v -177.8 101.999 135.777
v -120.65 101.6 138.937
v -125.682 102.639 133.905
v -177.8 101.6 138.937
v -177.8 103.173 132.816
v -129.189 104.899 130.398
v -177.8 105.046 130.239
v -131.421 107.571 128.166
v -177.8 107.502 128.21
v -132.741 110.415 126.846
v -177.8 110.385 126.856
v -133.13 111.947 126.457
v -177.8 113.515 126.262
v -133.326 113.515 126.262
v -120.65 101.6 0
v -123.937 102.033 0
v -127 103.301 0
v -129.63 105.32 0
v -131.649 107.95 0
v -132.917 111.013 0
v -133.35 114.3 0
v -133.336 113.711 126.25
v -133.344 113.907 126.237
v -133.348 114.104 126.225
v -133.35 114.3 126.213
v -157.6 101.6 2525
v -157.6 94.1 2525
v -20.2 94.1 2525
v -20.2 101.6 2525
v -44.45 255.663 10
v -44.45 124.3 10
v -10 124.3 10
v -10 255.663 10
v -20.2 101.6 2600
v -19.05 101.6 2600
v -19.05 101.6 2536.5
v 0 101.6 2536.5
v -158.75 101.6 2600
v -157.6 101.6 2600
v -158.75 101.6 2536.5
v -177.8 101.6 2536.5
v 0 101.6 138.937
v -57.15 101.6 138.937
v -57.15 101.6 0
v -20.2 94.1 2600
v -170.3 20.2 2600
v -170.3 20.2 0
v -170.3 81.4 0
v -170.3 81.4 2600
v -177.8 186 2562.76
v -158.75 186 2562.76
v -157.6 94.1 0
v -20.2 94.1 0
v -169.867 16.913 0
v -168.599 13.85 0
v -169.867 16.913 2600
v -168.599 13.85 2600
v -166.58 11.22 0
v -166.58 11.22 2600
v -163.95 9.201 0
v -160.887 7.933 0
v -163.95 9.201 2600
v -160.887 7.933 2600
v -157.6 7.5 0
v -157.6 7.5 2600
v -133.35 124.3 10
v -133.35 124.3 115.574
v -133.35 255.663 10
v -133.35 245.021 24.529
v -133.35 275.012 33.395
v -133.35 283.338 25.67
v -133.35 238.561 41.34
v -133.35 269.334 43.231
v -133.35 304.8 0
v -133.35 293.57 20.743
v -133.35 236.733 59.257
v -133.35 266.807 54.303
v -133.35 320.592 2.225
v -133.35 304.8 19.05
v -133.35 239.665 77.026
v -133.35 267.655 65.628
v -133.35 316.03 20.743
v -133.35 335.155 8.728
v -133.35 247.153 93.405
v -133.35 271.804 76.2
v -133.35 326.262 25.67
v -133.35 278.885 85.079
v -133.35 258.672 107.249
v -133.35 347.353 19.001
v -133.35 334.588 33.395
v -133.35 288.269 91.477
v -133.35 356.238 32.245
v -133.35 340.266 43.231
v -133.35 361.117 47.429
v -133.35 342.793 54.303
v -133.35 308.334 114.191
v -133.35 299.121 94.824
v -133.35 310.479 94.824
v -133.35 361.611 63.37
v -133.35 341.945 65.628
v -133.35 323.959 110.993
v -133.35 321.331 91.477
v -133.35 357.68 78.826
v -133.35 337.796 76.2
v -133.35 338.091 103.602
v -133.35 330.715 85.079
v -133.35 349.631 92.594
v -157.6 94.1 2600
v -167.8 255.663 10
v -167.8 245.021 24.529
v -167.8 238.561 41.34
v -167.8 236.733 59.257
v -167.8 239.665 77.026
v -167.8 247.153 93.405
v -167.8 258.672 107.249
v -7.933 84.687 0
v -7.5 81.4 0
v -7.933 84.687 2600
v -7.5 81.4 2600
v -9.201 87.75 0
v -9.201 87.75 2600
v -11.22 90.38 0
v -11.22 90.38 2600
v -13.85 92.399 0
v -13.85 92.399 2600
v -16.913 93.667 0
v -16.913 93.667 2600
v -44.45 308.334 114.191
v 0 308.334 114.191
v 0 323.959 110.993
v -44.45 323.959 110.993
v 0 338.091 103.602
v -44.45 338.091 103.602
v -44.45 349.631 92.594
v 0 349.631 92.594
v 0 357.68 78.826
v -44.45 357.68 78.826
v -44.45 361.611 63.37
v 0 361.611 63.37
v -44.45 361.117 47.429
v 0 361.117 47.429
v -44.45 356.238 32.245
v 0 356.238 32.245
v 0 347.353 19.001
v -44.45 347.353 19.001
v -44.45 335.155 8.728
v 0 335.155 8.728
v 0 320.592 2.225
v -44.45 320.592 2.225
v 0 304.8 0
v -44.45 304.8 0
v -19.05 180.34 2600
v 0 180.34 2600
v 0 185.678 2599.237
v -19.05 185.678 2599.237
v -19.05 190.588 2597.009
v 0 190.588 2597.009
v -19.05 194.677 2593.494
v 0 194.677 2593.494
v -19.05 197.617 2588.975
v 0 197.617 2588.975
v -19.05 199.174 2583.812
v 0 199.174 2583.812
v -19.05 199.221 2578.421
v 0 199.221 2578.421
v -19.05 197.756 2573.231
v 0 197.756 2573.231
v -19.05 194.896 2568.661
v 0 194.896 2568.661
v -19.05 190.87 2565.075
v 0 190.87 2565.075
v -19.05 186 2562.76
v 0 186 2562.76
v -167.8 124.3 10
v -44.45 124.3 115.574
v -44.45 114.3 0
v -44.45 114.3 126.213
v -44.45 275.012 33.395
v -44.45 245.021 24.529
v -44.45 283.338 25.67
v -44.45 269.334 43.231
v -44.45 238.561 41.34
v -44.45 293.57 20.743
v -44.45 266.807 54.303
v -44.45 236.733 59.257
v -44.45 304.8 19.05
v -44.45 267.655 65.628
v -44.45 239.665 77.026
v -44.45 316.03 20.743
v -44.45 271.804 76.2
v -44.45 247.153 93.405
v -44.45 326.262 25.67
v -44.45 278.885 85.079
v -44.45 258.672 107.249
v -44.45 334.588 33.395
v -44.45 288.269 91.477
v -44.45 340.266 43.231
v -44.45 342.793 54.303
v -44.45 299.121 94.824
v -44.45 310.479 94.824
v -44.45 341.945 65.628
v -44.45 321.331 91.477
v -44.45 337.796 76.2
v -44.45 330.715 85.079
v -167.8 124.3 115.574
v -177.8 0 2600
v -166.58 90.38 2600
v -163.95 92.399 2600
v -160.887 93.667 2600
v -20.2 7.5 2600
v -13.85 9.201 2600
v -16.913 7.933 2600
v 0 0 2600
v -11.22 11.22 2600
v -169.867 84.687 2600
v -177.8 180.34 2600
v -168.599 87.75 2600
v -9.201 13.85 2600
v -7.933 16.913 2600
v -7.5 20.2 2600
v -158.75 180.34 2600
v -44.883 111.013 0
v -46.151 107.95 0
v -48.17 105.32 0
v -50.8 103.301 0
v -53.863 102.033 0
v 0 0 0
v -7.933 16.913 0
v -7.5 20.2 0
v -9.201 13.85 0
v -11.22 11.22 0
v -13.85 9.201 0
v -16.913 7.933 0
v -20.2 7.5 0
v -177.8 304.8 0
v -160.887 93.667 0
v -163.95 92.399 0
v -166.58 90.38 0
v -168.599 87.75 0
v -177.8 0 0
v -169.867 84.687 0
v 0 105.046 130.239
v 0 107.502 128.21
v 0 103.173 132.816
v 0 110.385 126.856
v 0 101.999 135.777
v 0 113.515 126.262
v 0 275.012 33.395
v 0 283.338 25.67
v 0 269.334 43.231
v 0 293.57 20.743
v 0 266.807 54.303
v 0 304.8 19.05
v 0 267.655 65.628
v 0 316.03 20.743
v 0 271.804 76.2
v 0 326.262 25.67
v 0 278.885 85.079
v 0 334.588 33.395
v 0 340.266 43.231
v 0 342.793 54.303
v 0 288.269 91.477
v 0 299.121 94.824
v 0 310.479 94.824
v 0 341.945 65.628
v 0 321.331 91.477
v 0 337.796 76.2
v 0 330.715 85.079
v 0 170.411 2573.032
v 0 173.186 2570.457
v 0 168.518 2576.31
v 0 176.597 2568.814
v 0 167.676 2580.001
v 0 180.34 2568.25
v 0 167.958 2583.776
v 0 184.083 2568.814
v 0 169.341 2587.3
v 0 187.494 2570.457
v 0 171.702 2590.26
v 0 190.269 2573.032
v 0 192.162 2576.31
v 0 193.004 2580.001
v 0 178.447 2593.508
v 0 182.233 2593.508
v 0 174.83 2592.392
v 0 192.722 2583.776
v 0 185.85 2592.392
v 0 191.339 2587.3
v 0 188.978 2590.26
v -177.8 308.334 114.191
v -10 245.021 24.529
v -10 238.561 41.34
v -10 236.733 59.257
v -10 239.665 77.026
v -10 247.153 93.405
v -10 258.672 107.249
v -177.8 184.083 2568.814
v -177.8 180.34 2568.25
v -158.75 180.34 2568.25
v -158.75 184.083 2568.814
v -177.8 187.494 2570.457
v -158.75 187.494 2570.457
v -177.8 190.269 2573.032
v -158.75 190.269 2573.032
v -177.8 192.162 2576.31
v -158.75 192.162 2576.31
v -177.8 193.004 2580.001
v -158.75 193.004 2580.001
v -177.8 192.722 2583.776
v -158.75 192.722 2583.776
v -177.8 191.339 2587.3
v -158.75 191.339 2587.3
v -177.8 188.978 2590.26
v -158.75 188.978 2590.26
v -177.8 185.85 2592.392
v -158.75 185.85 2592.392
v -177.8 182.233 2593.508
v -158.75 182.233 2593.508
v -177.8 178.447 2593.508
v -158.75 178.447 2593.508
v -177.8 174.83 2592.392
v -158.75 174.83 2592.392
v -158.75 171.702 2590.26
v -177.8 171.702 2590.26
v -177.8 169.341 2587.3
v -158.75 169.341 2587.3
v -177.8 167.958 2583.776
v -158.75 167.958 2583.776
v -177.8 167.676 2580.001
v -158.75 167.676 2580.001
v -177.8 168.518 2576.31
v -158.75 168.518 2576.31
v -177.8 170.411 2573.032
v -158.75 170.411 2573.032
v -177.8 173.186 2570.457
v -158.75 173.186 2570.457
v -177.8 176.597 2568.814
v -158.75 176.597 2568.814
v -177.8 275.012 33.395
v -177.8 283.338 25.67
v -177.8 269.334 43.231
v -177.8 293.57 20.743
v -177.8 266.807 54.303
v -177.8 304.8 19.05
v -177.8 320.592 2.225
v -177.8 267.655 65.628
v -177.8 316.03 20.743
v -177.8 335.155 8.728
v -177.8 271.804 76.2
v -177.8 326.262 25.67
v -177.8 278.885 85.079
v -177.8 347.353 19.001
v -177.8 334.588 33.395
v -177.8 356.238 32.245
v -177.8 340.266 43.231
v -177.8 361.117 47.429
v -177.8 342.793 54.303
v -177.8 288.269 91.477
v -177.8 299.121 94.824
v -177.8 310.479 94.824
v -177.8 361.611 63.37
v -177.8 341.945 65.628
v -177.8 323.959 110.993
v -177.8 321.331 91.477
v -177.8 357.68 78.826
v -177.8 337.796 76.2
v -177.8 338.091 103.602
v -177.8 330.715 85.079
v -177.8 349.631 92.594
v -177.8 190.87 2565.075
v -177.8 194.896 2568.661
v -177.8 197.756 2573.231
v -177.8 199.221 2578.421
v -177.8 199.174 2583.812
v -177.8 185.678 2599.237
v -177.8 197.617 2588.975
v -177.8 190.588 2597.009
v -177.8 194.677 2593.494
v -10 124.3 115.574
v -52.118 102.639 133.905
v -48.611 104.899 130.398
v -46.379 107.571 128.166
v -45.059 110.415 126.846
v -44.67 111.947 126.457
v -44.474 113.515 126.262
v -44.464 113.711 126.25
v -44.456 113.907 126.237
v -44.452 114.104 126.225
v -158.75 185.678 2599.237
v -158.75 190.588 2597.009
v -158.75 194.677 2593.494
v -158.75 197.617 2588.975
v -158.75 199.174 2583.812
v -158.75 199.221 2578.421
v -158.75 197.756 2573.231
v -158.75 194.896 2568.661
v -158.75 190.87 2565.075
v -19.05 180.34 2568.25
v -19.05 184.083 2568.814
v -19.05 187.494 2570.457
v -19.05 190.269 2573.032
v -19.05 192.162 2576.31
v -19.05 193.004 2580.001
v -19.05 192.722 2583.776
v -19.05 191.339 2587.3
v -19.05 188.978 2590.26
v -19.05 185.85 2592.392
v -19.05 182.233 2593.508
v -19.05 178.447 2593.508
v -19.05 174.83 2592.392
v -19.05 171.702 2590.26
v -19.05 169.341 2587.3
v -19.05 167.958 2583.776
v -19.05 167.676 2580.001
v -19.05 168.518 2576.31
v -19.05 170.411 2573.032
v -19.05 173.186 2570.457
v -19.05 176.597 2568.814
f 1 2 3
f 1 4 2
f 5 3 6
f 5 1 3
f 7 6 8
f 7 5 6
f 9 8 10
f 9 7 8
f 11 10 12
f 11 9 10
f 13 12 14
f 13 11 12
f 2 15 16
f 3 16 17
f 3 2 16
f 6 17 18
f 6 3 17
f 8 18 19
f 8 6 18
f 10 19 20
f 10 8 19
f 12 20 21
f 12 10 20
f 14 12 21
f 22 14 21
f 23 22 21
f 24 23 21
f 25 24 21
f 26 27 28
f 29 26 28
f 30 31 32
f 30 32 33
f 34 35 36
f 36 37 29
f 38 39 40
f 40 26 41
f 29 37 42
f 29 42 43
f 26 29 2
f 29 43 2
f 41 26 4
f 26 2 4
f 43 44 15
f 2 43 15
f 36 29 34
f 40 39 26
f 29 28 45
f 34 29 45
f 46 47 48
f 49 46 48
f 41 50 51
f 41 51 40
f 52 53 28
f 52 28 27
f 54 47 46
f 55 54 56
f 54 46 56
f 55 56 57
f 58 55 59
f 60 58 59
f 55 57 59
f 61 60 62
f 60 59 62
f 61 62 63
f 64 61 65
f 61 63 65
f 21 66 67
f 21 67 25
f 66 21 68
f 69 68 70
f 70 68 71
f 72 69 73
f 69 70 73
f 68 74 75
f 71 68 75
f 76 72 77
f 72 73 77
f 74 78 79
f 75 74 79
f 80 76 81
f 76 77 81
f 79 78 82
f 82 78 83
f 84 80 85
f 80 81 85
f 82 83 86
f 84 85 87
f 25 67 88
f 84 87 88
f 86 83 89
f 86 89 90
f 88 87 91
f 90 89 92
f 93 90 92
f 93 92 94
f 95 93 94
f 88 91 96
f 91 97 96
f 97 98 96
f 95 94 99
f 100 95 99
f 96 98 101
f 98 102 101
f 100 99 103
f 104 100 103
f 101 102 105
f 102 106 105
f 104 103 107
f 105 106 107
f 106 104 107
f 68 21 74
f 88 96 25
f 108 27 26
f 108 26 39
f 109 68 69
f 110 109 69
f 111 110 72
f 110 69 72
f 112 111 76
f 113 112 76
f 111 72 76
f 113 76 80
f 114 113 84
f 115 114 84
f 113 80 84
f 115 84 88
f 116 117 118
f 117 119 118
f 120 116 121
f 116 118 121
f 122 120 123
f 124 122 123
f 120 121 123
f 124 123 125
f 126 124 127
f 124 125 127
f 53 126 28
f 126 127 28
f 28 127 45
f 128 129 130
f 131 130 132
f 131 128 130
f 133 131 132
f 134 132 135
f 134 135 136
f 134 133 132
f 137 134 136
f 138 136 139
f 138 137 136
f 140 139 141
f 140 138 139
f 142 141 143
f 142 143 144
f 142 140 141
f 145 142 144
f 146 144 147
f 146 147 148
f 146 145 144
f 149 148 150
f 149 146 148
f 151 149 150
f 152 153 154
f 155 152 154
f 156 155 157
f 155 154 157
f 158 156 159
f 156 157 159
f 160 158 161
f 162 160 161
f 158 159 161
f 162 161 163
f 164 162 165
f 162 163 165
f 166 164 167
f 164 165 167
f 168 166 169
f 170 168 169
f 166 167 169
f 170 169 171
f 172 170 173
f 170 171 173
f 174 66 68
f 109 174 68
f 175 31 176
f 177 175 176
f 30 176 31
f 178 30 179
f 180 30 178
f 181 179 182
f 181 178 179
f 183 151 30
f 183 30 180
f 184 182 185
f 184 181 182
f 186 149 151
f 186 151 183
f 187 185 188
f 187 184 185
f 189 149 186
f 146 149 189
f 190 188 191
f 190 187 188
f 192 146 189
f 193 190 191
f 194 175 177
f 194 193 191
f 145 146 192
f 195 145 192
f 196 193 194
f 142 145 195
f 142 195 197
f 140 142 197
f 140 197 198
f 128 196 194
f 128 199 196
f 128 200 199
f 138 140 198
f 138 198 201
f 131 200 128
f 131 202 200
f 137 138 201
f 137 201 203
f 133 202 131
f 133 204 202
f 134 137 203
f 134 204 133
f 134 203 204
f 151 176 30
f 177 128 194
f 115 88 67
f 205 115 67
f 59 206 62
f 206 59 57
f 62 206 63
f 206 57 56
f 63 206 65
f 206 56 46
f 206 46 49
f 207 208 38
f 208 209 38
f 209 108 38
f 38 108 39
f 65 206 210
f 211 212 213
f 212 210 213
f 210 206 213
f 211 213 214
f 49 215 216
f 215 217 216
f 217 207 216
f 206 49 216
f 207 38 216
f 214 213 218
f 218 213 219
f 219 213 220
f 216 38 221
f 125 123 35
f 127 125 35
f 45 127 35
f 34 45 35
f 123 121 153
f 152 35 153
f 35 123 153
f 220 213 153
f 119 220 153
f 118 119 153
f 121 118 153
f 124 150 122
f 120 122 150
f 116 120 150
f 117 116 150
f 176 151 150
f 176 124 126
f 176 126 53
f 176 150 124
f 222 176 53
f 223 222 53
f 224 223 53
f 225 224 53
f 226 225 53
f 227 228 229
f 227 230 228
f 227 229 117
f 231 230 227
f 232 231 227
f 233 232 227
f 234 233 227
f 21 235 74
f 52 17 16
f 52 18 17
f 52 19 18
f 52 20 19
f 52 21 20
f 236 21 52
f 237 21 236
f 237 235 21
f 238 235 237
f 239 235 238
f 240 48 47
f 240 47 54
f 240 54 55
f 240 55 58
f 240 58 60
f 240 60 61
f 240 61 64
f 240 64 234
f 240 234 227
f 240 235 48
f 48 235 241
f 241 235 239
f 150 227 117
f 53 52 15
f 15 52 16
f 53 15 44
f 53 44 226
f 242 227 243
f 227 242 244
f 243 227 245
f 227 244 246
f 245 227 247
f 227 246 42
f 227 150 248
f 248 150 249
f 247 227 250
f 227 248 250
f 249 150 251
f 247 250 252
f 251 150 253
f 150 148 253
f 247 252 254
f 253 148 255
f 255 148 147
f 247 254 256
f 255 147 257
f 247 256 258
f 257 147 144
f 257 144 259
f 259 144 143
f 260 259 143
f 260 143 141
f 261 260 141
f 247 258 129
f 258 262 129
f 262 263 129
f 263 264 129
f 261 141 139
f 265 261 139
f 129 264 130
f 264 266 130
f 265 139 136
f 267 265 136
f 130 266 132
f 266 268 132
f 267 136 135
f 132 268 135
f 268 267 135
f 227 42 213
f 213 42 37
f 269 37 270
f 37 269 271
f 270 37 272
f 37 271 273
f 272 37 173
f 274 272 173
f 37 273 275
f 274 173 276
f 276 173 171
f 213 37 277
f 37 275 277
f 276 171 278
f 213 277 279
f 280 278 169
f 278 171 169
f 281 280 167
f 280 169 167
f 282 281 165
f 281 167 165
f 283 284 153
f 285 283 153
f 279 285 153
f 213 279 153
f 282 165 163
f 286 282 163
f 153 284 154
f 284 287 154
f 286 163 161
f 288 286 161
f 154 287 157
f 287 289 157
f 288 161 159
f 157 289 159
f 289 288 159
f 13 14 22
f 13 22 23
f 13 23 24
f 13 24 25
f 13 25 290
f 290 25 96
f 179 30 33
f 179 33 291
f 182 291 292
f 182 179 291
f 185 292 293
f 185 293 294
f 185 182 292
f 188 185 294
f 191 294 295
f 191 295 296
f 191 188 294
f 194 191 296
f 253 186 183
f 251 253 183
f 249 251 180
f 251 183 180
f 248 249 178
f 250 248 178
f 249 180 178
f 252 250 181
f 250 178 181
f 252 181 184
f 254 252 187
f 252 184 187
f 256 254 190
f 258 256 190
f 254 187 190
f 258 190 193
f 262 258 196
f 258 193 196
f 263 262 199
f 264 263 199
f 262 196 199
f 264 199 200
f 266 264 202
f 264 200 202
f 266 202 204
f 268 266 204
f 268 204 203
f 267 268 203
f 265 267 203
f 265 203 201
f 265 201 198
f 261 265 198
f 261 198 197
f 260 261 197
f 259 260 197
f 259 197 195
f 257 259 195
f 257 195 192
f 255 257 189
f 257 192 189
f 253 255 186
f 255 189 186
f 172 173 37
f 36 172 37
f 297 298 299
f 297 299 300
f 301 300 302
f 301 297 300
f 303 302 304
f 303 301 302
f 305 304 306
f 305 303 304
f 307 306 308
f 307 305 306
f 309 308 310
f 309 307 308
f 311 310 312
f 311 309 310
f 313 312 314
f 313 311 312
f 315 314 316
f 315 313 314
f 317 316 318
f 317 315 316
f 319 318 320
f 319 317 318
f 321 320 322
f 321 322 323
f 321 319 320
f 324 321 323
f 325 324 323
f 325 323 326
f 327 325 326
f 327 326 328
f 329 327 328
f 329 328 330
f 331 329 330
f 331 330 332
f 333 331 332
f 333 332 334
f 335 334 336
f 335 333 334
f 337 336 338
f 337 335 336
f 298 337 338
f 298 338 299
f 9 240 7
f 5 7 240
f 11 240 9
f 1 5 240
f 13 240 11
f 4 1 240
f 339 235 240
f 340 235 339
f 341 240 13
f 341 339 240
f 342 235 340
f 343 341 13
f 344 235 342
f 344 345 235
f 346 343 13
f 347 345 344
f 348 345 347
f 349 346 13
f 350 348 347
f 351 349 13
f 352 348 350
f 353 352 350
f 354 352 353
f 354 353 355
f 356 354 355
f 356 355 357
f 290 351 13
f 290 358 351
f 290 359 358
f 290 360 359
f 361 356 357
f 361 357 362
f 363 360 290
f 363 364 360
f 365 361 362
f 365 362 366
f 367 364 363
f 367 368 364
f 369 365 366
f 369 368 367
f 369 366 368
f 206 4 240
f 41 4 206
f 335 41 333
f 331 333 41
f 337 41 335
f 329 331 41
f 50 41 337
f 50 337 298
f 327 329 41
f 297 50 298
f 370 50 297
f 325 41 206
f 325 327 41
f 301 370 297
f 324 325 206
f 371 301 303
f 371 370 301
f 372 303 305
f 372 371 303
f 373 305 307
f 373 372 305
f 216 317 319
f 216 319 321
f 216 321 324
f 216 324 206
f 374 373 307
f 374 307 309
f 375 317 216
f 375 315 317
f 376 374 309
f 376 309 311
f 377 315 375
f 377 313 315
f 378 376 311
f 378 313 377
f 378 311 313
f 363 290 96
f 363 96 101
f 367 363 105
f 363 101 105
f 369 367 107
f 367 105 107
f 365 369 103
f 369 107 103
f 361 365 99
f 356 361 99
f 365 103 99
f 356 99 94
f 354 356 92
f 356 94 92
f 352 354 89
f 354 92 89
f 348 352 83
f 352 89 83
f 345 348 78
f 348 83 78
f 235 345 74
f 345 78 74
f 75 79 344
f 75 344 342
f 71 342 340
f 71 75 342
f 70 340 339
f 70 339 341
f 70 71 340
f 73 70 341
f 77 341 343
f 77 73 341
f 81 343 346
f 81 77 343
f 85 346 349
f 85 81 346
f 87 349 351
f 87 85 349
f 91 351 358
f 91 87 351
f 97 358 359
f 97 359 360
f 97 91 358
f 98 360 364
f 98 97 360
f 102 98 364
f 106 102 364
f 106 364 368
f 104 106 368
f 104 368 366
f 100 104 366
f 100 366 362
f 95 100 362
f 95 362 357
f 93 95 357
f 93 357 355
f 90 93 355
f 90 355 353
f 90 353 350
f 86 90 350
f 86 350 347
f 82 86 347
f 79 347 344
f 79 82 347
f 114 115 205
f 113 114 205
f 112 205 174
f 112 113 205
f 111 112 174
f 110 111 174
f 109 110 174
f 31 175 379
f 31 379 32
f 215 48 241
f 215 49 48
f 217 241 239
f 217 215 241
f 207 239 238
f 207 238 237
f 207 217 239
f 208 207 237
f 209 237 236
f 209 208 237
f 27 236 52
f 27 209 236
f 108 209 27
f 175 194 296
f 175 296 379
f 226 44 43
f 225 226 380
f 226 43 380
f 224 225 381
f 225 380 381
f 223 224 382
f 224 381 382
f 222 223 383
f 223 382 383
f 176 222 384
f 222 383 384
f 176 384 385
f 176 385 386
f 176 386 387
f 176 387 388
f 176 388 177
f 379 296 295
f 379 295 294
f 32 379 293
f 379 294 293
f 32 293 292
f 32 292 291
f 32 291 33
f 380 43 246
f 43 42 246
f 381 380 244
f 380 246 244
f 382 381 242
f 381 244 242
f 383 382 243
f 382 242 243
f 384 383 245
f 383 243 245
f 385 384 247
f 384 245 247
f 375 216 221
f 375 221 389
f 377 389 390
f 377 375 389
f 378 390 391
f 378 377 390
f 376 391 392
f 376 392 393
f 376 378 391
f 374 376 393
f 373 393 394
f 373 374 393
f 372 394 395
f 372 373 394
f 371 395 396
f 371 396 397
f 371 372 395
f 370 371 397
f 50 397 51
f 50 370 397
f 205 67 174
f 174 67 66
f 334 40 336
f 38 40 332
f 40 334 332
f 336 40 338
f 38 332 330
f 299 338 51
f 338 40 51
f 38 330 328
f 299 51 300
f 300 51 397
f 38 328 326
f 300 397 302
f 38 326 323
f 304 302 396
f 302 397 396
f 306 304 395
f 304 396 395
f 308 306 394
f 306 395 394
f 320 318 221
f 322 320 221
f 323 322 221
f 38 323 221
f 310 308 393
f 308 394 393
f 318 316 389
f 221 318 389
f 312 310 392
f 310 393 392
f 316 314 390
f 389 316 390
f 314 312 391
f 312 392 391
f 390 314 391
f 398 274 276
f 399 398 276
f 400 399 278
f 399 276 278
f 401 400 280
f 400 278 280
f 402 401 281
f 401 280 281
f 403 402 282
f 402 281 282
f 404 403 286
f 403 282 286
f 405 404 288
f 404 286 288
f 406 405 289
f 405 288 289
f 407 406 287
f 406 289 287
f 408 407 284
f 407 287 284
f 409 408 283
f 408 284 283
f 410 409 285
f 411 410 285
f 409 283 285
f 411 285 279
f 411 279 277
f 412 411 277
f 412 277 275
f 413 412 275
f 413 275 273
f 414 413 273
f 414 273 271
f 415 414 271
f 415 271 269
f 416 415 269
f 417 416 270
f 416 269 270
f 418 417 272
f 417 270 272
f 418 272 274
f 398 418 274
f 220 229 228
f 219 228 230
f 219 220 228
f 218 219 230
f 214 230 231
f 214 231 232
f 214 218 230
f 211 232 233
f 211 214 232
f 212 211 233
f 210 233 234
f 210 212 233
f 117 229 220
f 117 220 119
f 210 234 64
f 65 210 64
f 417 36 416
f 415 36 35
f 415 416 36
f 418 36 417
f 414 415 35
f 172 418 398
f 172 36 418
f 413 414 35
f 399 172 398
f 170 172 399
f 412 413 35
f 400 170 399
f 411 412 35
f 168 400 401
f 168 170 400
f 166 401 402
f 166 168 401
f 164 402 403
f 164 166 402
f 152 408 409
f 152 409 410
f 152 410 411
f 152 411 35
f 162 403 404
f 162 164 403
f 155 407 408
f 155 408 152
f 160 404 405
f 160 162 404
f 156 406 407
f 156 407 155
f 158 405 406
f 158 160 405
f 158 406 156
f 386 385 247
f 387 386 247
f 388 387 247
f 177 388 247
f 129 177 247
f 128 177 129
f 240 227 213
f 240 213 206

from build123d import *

# Parameters (mm, degrees)
SKETCH2_W               = 177.8
SKETCH2_H               = 101.6
SKETCH2_W_2             = 162.8
SKETCH2_H_2             = 86.6
BOSS_EXTRUDE2_DEPTH     = 2600
SKETCH1_R               = 38.1
BOSS_EXTRUDE3_DEPTH     = 44.45
BOSS_EXTRUDE5_START     = -44.45
SKETCH3_R               = 38.1
BOSS_EXTRUDE5_DEPTH     = 44.45
FILLET1_R               = 12.7
FILLET2_R               = 12.7
SKETCH5_R               = 12.7
BOSS_EXTRUDE7_DEPTH     = 19.05
CUT_EXTRUDE1_DEPTH      = 34.45
CUT_EXTRUDE2_DEPTH      = 2620.044665999
CUT_EXTRUDE2_DEPTH_BACK = 2620.044665999
SKETCH9_W               = 88.9
SKETCH9_H               = 2600
SKETCH10_W              = 137.4
SKETCH10_H              = 75
CUT_EXTRUDE3_DEPTH      = 10


with BuildPart() as part:
    # Sketch2 → Boss-Extrude2 (new body)
    with BuildSketch(Plane.XY):
        with Locations((-88.9, 50.8)):
            Rectangle(SKETCH2_W, SKETCH2_H)
        with Locations((-88.9, 50.8)):
            Rectangle(SKETCH2_W_2, SKETCH2_H_2, mode=Mode.SUBTRACT)
    extrude(amount=BOSS_EXTRUDE2_DEPTH)

    # Sketch1 → Boss-Extrude3 (add)
    with BuildSketch(Plane(origin=(0, 0, 0), x_dir=(0, 0, -1), z_dir=(1, 0, 0))):
        with BuildLine():
            Line((-127, 101.6), (0, 101.6))
            Line((0, 101.6), (0, 304.8))
            ThreePointArc((0, 304.8), (-55.382017361, 361.922646449), (-114.190611982, 308.334272869))
            Line((-114.190611982, 308.334272869), (-127, 101.6))
        make_face()
        with Locations((-57.15, 304.8)):
            Circle(SKETCH1_R, mode=Mode.SUBTRACT)
    extrude(amount=-BOSS_EXTRUDE3_DEPTH)

    # Sketch3 → Boss-Extrude5 (add)
    with BuildSketch(Plane.ZY.offset(177.8).offset(BOSS_EXTRUDE5_START)):
        with BuildLine():
            Line((0, 304.8), (0, 101.6))
            Line((0, 101.6), (127, 101.6))
            Line((127, 101.6), (114.190611982, 308.334272869))
            ThreePointArc((114.190611982, 308.334272869), (55.382017361, 361.922646449), (0, 304.8))
        make_face()
        with Locations(Location((57.15, 304.8, 0), (0, 0, 180))):
            Circle(SKETCH3_R, mode=Mode.SUBTRACT)
    extrude(amount=BOSS_EXTRUDE5_DEPTH)

    # Fillet1
    fillet1_edges = [part.edges().sort_by_distance(p)[0] for p in [
        (-7.5, 94.1, 1300),
        (-170.3, 94.1, 1300),
        (-170.3, 7.5, 1300),
        (-7.5, 7.5, 1300),
    ]]
    fillet(fillet1_edges, radius=FILLET1_R)

    # Fillet2
    fillet2_edges = [part.edges().sort_by_distance(p)[0] for p in [
        (-44.45, 101.6, 63.5),
        (-22.225, 101.6, 127),
        (-133.35, 101.6, 63.5),
        (-155.575, 101.6, 127),
    ]]
    fillet(fillet2_edges, radius=FILLET2_R)

    # Sketch5 → Boss-Extrude7 (add)
    with BuildSketch(Plane(origin=(0, 0, 0), x_dir=(0, 0, -1), z_dir=(1, 0, 0))):
        with BuildLine():
            Line((-2600, 101.6), (-2600, 180.34))
            ThreePointArc((-2600, 180.34), (-2583.812295525, 199.173740052), (-2562.760129729, 185.999604185))
            Line((-2562.760129729, 185.999604185), (-2536.5, 101.6))
            Line((-2536.5, 101.6), (-2600, 101.6))
        make_face()
        with Locations((-2580.95, 180.34)):
            Circle(SKETCH5_R, mode=Mode.SUBTRACT)
    boss_extrude7 = extrude(amount=-BOSS_EXTRUDE7_DEPTH)

    # Mirror1: Boss-Extrude7 across plane
    add(boss_extrude7.mirror(Plane.ZY.offset(88.9)))

    # Sketch8 → Cut-Extrude1 (cut)
    with BuildSketch(Plane(origin=(-133.35, 0, 0), x_dir=(0, 0, -1), z_dir=(1, 0, 0))):
        with BuildLine():
            ThreePointArc((-10, 255.662565187), (-59.256729969, 236.73259452), (-107.248511945, 258.672469165))
            Line((-107.248511945, 258.672469165), (-115.574316238, 124.3))
            Line((-115.574316238, 124.3), (-10, 124.3))
            Line((-10, 124.3), (-10, 255.662565187))
        make_face()
    extrude(amount=-CUT_EXTRUDE1_DEPTH, mode=Mode.SUBTRACT)

    # Sketch9 → Cut-Extrude2 (cut, two sides: drawn at the far end of the back side and taken through both)
    with BuildSketch(Plane(origin=(0, 101.6, 0), x_dir=(1, 0, 0), z_dir=(0, 1, 0)).offset(-CUT_EXTRUDE2_DEPTH_BACK)):
        with Locations((-44.45, -1300)):
            Rectangle(SKETCH9_W, SKETCH9_H)
    extrude(amount=CUT_EXTRUDE2_DEPTH + CUT_EXTRUDE2_DEPTH_BACK, mode=Mode.SUBTRACT)

    # Mirror2: part across plane


with BuildPart() as part_1:
    add(part.part)
    add(part.part.mirror(Plane.ZY.offset(88.9)))

    # Sketch10 → Cut-Extrude3 (cut)
    with BuildSketch(Plane.XZ.offset(-94.1)):
        with Locations((-88.9, 2562.5)):
            Rectangle(SKETCH10_W, SKETCH10_H)
    extrude(amount=-CUT_EXTRUDE3_DEPTH, mode=Mode.SUBTRACT)


solid = part_1.part
